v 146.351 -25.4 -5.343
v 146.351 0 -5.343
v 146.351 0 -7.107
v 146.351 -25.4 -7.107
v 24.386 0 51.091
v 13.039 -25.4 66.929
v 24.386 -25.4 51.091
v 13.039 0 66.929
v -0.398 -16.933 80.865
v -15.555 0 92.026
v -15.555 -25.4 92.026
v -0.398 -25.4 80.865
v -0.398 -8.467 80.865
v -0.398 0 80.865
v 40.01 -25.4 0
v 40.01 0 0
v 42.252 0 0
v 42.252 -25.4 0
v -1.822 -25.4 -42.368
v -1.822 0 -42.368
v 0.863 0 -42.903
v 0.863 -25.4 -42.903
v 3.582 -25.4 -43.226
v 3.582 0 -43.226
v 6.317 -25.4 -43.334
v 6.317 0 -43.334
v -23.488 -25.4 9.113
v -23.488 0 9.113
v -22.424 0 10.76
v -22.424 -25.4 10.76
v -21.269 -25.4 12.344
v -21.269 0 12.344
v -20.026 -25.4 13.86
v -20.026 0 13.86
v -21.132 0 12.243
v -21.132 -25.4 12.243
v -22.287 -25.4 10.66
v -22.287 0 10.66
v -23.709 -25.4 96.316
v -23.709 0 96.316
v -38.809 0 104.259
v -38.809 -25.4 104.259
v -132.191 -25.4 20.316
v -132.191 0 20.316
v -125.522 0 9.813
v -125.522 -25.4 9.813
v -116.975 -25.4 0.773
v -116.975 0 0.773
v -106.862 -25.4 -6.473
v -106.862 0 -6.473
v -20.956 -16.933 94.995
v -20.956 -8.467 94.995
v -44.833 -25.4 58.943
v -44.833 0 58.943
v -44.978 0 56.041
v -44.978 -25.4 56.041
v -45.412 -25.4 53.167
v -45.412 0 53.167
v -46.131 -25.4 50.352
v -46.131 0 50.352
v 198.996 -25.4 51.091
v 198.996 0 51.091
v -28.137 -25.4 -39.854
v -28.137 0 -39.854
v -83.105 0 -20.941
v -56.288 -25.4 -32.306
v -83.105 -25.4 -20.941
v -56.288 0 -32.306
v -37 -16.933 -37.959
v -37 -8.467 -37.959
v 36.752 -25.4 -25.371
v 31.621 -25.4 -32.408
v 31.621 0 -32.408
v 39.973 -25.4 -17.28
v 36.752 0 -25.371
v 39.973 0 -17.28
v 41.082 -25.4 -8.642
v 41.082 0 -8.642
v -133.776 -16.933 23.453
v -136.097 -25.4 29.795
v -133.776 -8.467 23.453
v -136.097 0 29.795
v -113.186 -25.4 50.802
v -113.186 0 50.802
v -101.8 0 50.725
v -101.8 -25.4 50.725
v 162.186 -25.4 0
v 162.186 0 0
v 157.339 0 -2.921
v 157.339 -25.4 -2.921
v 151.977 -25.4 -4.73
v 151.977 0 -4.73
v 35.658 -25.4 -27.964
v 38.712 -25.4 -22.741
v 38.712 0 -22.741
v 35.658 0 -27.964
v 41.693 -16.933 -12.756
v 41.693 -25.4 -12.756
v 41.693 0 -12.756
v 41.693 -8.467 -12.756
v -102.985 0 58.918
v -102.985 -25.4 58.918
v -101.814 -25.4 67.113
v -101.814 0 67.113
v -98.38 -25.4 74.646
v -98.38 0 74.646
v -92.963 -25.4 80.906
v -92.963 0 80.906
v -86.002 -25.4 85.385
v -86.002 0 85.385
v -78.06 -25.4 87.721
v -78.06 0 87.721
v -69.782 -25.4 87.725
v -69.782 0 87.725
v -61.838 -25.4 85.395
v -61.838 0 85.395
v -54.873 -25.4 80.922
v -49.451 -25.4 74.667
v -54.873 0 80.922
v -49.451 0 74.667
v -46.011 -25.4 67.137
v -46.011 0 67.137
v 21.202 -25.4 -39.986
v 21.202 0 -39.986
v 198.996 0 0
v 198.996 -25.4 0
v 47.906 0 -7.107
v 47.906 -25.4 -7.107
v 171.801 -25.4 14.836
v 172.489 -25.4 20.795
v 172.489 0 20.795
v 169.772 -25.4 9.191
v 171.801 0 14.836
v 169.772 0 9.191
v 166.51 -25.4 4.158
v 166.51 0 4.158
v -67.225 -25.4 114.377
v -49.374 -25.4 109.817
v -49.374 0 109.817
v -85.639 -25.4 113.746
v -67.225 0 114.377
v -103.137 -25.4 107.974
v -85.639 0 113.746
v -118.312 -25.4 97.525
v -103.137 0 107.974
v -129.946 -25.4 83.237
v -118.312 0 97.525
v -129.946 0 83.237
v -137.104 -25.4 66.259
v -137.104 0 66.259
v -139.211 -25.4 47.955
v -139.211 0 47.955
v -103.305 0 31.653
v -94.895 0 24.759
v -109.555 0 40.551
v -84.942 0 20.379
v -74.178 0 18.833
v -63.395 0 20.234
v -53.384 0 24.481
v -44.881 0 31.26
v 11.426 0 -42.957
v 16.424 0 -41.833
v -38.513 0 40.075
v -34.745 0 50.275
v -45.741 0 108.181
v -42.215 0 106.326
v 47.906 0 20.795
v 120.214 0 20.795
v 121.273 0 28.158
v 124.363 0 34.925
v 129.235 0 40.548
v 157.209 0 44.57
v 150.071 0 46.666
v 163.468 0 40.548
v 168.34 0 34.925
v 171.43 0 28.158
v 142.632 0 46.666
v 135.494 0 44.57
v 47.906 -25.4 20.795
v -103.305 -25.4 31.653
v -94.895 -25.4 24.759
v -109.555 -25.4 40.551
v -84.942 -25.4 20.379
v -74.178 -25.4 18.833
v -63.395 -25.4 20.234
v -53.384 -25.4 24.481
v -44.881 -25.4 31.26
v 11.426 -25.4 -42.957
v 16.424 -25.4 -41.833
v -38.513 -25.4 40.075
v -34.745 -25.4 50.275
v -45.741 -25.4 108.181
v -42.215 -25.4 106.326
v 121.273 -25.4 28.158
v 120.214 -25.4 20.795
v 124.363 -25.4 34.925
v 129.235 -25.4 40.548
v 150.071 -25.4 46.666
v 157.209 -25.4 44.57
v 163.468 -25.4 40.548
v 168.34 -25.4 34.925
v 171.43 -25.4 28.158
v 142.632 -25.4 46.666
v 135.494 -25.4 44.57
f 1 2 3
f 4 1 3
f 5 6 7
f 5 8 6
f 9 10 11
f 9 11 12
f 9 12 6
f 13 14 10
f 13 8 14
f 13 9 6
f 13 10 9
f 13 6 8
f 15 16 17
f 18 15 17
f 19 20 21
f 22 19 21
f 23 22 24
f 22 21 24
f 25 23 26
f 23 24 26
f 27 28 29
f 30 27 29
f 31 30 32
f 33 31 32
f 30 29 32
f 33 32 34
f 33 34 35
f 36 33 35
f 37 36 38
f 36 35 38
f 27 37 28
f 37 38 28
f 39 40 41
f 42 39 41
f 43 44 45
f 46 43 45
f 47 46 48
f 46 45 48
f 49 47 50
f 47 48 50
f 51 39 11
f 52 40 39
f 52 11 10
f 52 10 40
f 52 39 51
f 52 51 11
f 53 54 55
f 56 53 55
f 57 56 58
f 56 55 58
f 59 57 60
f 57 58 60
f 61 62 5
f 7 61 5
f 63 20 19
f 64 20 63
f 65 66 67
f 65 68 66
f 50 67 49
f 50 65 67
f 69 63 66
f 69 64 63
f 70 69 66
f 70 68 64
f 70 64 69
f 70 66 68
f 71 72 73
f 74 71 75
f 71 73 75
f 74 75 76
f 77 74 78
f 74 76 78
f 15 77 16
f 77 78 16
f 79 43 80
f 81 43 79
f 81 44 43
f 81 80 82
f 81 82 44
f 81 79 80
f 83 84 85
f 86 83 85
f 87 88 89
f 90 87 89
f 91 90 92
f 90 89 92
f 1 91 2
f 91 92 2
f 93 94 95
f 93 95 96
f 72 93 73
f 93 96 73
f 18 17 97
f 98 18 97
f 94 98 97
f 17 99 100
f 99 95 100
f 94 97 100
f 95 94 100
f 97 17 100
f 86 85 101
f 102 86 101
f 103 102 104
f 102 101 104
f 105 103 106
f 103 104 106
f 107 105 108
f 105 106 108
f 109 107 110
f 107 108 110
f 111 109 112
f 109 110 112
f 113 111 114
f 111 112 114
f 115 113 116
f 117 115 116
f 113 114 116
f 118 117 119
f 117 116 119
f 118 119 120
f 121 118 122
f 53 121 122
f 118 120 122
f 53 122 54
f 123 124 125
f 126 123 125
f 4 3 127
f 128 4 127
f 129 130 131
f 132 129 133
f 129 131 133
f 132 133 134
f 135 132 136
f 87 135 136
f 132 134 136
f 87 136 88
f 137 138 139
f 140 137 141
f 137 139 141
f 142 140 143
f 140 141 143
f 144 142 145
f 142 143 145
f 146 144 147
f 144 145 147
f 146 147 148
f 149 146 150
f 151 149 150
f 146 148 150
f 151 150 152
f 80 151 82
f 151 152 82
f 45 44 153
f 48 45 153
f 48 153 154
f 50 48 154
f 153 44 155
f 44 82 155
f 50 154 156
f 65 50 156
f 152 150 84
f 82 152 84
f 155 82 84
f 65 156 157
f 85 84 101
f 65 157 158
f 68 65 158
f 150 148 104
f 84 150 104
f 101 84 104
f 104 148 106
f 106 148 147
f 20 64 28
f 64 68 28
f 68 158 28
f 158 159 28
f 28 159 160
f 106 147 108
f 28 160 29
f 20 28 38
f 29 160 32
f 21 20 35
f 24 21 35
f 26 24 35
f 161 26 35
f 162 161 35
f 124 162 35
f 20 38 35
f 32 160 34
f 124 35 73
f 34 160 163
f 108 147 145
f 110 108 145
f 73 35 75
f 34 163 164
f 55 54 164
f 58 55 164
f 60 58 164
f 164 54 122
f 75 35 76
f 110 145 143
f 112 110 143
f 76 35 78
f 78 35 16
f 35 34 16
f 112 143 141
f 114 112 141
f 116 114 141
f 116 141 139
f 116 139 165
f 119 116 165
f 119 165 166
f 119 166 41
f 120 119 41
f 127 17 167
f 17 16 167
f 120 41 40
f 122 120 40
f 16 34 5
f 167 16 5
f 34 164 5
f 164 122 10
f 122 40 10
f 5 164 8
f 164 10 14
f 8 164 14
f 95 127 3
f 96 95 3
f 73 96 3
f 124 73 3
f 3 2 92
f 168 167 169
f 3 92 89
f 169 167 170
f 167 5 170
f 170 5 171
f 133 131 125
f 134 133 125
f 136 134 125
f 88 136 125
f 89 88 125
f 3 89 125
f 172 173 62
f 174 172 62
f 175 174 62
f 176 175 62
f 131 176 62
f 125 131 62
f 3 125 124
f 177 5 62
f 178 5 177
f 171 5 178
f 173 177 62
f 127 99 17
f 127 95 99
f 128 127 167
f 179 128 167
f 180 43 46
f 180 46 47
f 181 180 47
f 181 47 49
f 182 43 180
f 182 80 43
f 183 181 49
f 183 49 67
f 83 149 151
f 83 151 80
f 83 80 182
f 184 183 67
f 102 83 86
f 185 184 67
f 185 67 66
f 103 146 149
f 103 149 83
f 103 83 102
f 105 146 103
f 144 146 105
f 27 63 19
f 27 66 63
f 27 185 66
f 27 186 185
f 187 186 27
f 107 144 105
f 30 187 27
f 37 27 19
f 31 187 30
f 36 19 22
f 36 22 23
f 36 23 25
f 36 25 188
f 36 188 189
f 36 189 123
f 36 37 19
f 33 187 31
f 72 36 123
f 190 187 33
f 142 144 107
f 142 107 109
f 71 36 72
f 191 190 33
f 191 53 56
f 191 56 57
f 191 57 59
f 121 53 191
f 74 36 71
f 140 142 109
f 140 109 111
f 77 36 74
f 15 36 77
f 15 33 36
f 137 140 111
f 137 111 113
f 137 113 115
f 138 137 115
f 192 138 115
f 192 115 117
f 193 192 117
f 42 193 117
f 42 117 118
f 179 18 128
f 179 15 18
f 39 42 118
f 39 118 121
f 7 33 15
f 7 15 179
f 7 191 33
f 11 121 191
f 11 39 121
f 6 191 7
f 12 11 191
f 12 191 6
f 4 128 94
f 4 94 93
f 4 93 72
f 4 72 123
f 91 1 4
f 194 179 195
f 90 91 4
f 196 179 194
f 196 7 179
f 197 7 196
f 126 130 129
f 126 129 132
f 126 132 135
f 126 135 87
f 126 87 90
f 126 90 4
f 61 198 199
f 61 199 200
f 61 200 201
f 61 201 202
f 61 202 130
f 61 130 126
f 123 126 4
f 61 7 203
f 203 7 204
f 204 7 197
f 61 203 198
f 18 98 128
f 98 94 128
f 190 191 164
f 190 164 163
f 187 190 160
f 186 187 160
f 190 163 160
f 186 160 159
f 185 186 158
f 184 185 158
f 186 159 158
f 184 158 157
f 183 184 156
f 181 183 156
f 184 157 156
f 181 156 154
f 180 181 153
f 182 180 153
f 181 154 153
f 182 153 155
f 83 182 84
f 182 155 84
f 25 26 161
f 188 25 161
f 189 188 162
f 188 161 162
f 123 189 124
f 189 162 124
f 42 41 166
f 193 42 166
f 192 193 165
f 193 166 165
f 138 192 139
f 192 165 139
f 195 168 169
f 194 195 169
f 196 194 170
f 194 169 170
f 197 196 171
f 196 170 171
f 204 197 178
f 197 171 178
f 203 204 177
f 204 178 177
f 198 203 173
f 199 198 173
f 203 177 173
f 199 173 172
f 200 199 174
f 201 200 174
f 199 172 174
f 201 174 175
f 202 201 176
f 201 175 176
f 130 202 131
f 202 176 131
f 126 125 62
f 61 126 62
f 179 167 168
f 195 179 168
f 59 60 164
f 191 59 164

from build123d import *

# Parameters (mm, degrees)
F1_DEPTH = 25.4


with BuildPart() as f1:
    # F0 (on Front) → F1 (new body)
    with BuildSketch(Plane.XZ):
        with BuildLine():
            ThreePointArc((-23.4881200852, 9.1129863922), (-25.7569087098, 4.6952436795), (-27.3750988376, 0))
            ThreePointArc((-27.3750988376, 0), (-23.4523587377, -26.5236540337), (-1.822285639, -42.3676450379))
            add(Edge.make_bspline(
                [(31.6214489009, -32.408137431), (24.0381488742, -39.1257279454), (12.1793845571, -42.1949100042), (-1.822285639, -42.3676450379)],
                knots=[0.3305657958, 0.3305657958, 0.3305657958, 0.3305657958, 0.4117411776, 0.4117411776, 0.4117411776, 0.4117411776], degree=3))
            ThreePointArc((31.6214489009, -32.408137431), (39.9732334064, -17.2802023076), (40.0097537836, 0))
            Line((40.0097537836, 0), (24.3855283995, 0))
            Line((24.3855283995, 0), (24.3855283995, 20.8383404807))
            ThreePointArc((24.3855283995, 20.8383404808), (0.9049170427, 25.4619632407), (-20.0263610495, 13.8602998023))
            ThreePointArc((-20.0263610495, 13.8602998023), (-21.7035792641, 11.4475130703), (-23.4881200852, 9.1129863922))
        make_face()
        with BuildLine():
            ThreePointArc((-1.822285639, -42.3676450379), (-23.4523587377, -26.5236540337), (-27.3750988376, 0))
            ThreePointArc((-27.3750988376, 0), (-25.7569087098, 4.6952436795), (-23.4881200852, 9.1129863922))
            ThreePointArc((-23.4881200852, 9.1129863922), (-62.2831037982, -14.1508466737), (-106.8623494937, -6.4731163171))
            add(Edge.make_bspline(
                [(-1.822285639, -42.3676450379), (-34.1627739251, -42.7666213928), (-77.9356396487, -27.7130872373), (-106.8623494937, -6.4731163171)],
                knots=[0.4117411776, 0.4117411776, 0.4117411776, 0.4117411776, 0.5992367726, 0.5992367726, 0.5992367726, 0.5992367726], degree=3))
        make_face()
        with BuildLine():
            add(Edge.make_bspline(
                [(31.6214489009, -32.408137431), (24.0381488742, -39.1257279454), (12.1793845571, -42.1949100042), (-1.822285639, -42.3676450379)],
                knots=[0.3305657958, 0.3305657958, 0.3305657958, 0.3305657958, 0.4117411776, 0.4117411776, 0.4117411776, 0.4117411776], degree=3))
            ThreePointArc((-1.822285639, -42.3676450379), (2.2189423584, -43.0915267187), (6.317327473, -43.3339475664))
            Line((6.317327473, -43.3339475664), (21.2019422511, -39.9863561607))
            ThreePointArc((21.2019422511, -39.9863561607), (26.7658232425, -36.6841469116), (31.6214489009, -32.408137431))
        make_face()
        with BuildLine():
            ThreePointArc((-106.8623494937, -6.4731163171), (-62.2831037982, -14.1508466737), (-23.4881200852, 9.1129863922))
            ThreePointArc((-23.4881200852, 9.1129863922), (-21.8574061869, 11.5596842489), (-20.0263610495, 13.8602998023))
            ThreePointArc((-20.0263610495, 13.8602998023), (-11.9815447312, 31.0090830109), (-9.2218346427, 49.7489825666))
            ThreePointArc((-9.2218346427, 49.7489825666), (-15.373040222, 77.3515736193), (-32.6625531747, 99.7304275837))
            add(Edge.make_bspline(
                [(-136.0971185339, 29.794675775), (-147.1795152867, 70.6622045283), (-83.4949169934, 115.3318185014), (-32.6625531747, 99.7304275837)],
                knots=[0.6952883419, 0.6952883419, 0.6952883419, 0.6952883419, 1, 1, 1, 1], degree=3))
            ThreePointArc((-136.0971185339, 29.794675775), (-134.3309912676, 24.9782257744), (-132.1905665466, 20.3160397911))
            add(Edge.make_bspline(
                [(-106.8623494937, -6.4731163171), (-118.0127633165, 1.7142809574), (-126.9572157407, 10.8209088266), (-132.1905665466, 20.3160397911)],
                knots=[0.5992367726, 0.5992367726, 0.5992367726, 0.5992367726, 0.6715109264, 0.6715109264, 0.6715109264, 0.6715109264], degree=3))
        make_face()
        with BuildLine():
            ThreePointArc((-34.7453205512, 50.2754222832), (-74.1782043044, 18.8325014661), (-113.1855020537, 50.8018666913))
            Line((-113.1855020537, 50.8018666913), (-101.7999106632, 50.7254532919))
            ThreePointArc((-101.7999106632, 50.7254532918), (-78.0602804594, 87.7213526899), (-44.8327322387, 58.9429466583))
            ThreePointArc((-44.8327322387, 58.9429466583), (-45.1591089284, 54.5986268514), (-46.1309119417, 50.3518356826))
            Line((-46.1309119417, 50.3518356826), (-34.7453205512, 50.2754222832))
        make_face(mode=Mode.SUBTRACT)
        with BuildLine():
            Line((21.2019422511, -39.9863561607), (6.317327473, -43.3339475664))
            ThreePointArc((6.317327473, -43.3339475664), (13.9455337712, -42.486726351), (21.2019422511, -39.9863561607))
        make_face()
        with BuildLine():
            add(Edge.make_bspline(
                [(42.2519440934, 0), (43.0667519502, -13.4532818738), (39.8786763522, -25.0935550451), (31.6214489009, -32.408137431)],
                knots=[0.2421763625, 0.2421763625, 0.2421763625, 0.2421763625, 0.3305657958, 0.3305657958, 0.3305657958, 0.3305657958], degree=3))
            ThreePointArc((31.6214489009, -32.408137431), (26.7658232425, -36.6841469116), (21.2019422511, -39.9863561607))
            Line((21.2019422511, -39.9863561607), (198.9958948854, 0))
            Line((198.9958948854, 0), (162.1864286042, 0))
            ThreePointArc((162.1864286042, 0), (154.7074790766, -3.9710732295), (146.3514873037, -5.3427547241))
            Line((146.3514873037, -5.3427547241), (146.3514873037, -7.1069937982))
            Line((146.3514873037, -7.1069937982), (47.9064245235, -7.1069937982))
            Line((47.9064245235, -7.1069937982), (47.9064245235, 0))
            Line((47.9064245235, 0), (42.2519440934, 0))
        make_face()
        with BuildLine():
            ThreePointArc((-132.1905665466, 20.3160397911), (-121.4653525437, 5.0883042782), (-106.8623494937, -6.4731163171))
            add(Edge.make_bspline(
                [(-106.8623494937, -6.4731163171), (-118.0127633165, 1.7142809574), (-126.9572157407, 10.8209088266), (-132.1905665466, 20.3160397911)],
                knots=[0.5992367726, 0.5992367726, 0.5992367726, 0.5992367726, 0.6715109264, 0.6715109264, 0.6715109264, 0.6715109264], degree=3))
        make_face()
        with BuildLine():
            ThreePointArc((-9.2218346427, 49.7489825666), (-11.9815447312, 31.0090830109), (-20.0263610495, 13.8602998023))
            ThreePointArc((-20.0263610495, 13.8602998023), (0.9049170427, 25.4619632407), (24.3855283995, 20.8383404808))
            Line((24.3855283995, 20.8383404807), (24.3855283995, 51.0906824548))
            add(Edge.make_bspline(
                [(-15.5554291457, 92.0261433749), (0.3390335994, 82.5415688484), (14.2065732282, 67.591169523), (24.3855283995, 51.0906824548)],
                knots=[0.0353561549, 0.0353561549, 0.0353561549, 0.0353561549, 0.1378329831, 0.1378329831, 0.1378329831, 0.1378329831], degree=3))
            Line((-15.5554291457, 92.0261433749), (-23.7091819765, 96.3155100856))
            add(Edge.make_bspline(
                [(-32.6625531747, 99.7304275837), (-29.6292369493, 98.7994468334), (-26.6416857173, 97.653849539), (-23.7091819765, 96.3155100856)],
                knots=[0, 0, 0, 0, 0.0181830383, 0.0181830383, 0.0181830383, 0.0181830383], degree=3))
            ThreePointArc((-32.6625531747, 99.7304275837), (-15.373040222, 77.3515736193), (-9.2218346427, 49.7489825666))
        make_face()
        with BuildLine():
            Line((24.3855283995, 0), (40.0097537836, 0))
            ThreePointArc((40.0097537836, 0), (34.2162475505, 11.9326862666), (24.3855283995, 20.8383404808))
            Line((24.3855283995, 20.8383404807), (24.3855283995, 0))
        make_face()
        with BuildLine():
            ThreePointArc((24.3855283995, 20.8383404808), (34.2162475505, 11.9326862666), (40.0097537836, 0))
            Line((40.0097537836, 0), (42.2519440934, 0))
            add(Edge.make_bspline(
                [(24.3855283995, 51.0906824548), (34.7498868563, 34.2896493617), (41.2900666127, 15.8815465109), (42.2519440934, 0)],
                knots=[0.1378329831, 0.1378329831, 0.1378329831, 0.1378329831, 0.2421763625, 0.2421763625, 0.2421763625, 0.2421763625], degree=3))
            Line((24.3855283995, 51.0906824548), (24.3855283995, 20.8383404807))
        make_face()
        with BuildLine():
            add(Edge.make_bspline(
                [(24.3855283995, 51.0906824548), (34.7498868563, 34.2896493617), (41.2900666127, 15.8815465109), (42.2519440934, 0)],
                knots=[0.1378329831, 0.1378329831, 0.1378329831, 0.1378329831, 0.2421763625, 0.2421763625, 0.2421763625, 0.2421763625], degree=3))
            Line((42.2519440934, 0), (47.9064245235, 0))
            Line((47.9064245235, 0), (47.9064245235, 20.7945478899))
            Line((47.9064245235, 20.7945478899), (120.2141846897, 20.7945478899))
            ThreePointArc((120.2141846897, 20.7945478899), (146.3514873037, 46.931850504), (172.4887899177, 20.7945478899))
            ThreePointArc((172.4887899177, 20.7945478899), (169.7720043836, 9.1911877022), (162.1864286042, 0))
            Line((162.1864286042, 0), (198.9958948854, 0))
            Line((198.9958948854, 0), (198.9958948854, 51.0906824548))
            Line((198.9958948854, 51.0906824548), (24.3855283995, 51.0906824548))
        make_face()
        with BuildLine():
            add(Edge.make_bspline(
                [(-132.1905665466, 20.3160397911), (-133.9122824029, 23.4398352609), (-135.2323312991, 26.6056799314), (-136.0971185339, 29.794675775)],
                knots=[0.6715109264, 0.6715109264, 0.6715109264, 0.6715109264, 0.6952883419, 0.6952883419, 0.6952883419, 0.6952883419], degree=3))
            ThreePointArc((-132.1905665466, 20.3160397911), (-134.3309912676, 24.9782257744), (-136.0971185339, 29.794675775))
        make_face()
        with BuildLine():
            ThreePointArc((-49.373536191, 109.8165112697), (-118.3123179762, 97.5246309308), (-136.0971185339, 29.794675775))
            add(Edge.make_bspline(
                [(-136.0971185339, 29.794675775), (-147.1795152867, 70.6622045283), (-83.4949169934, 115.3318185014), (-32.6625531747, 99.7304275837)],
                knots=[0.6952883419, 0.6952883419, 0.6952883419, 0.6952883419, 1, 1, 1, 1], degree=3))
            ThreePointArc((-32.6625531747, 99.7304275837), (-35.6692605933, 102.0849992123), (-38.8090434498, 104.2589496877))
            Line((-38.8090434498, 104.2589496877), (-49.373536191, 109.8165112697))
        make_face()
        with BuildLine():
            ThreePointArc((-38.8090434498, 104.2589496877), (-35.6692605933, 102.0849992123), (-32.6625531747, 99.7304275837))
            add(Edge.make_bspline(
                [(-32.6625531747, 99.7304275837), (-29.6292369493, 98.7994468334), (-26.6416857173, 97.653849539), (-23.7091819765, 96.3155100856)],
                knots=[0, 0, 0, 0, 0.0181830383, 0.0181830383, 0.0181830383, 0.0181830383], degree=3))
            Line((-23.7091819765, 96.3155100856), (-38.8090434498, 104.2589496877))
        make_face()
        with BuildLine():
            Line((-23.7091819765, 96.3155100856), (-15.5554291457, 92.0261433749))
            add(Edge.make_bspline(
                [(-23.7091819765, 96.3155100856), (-20.9395552466, 95.0515046312), (-18.2190309331, 93.615572981), (-15.5554291457, 92.0261433749)],
                knots=[0.0181830383, 0.0181830383, 0.0181830383, 0.0181830383, 0.0353561549, 0.0353561549, 0.0353561549, 0.0353561549], degree=3))
        make_face()
        with BuildLine():
            ThreePointArc((-38.8090434498, 104.2589496877), (-43.9634537245, 107.2807369641), (-49.373536191, 109.8165112697))
            Line((-49.373536191, 109.8165112697), (-38.8090434498, 104.2589496877))
        make_face()
    extrude(amount=F1_DEPTH)


solid = f1.part
